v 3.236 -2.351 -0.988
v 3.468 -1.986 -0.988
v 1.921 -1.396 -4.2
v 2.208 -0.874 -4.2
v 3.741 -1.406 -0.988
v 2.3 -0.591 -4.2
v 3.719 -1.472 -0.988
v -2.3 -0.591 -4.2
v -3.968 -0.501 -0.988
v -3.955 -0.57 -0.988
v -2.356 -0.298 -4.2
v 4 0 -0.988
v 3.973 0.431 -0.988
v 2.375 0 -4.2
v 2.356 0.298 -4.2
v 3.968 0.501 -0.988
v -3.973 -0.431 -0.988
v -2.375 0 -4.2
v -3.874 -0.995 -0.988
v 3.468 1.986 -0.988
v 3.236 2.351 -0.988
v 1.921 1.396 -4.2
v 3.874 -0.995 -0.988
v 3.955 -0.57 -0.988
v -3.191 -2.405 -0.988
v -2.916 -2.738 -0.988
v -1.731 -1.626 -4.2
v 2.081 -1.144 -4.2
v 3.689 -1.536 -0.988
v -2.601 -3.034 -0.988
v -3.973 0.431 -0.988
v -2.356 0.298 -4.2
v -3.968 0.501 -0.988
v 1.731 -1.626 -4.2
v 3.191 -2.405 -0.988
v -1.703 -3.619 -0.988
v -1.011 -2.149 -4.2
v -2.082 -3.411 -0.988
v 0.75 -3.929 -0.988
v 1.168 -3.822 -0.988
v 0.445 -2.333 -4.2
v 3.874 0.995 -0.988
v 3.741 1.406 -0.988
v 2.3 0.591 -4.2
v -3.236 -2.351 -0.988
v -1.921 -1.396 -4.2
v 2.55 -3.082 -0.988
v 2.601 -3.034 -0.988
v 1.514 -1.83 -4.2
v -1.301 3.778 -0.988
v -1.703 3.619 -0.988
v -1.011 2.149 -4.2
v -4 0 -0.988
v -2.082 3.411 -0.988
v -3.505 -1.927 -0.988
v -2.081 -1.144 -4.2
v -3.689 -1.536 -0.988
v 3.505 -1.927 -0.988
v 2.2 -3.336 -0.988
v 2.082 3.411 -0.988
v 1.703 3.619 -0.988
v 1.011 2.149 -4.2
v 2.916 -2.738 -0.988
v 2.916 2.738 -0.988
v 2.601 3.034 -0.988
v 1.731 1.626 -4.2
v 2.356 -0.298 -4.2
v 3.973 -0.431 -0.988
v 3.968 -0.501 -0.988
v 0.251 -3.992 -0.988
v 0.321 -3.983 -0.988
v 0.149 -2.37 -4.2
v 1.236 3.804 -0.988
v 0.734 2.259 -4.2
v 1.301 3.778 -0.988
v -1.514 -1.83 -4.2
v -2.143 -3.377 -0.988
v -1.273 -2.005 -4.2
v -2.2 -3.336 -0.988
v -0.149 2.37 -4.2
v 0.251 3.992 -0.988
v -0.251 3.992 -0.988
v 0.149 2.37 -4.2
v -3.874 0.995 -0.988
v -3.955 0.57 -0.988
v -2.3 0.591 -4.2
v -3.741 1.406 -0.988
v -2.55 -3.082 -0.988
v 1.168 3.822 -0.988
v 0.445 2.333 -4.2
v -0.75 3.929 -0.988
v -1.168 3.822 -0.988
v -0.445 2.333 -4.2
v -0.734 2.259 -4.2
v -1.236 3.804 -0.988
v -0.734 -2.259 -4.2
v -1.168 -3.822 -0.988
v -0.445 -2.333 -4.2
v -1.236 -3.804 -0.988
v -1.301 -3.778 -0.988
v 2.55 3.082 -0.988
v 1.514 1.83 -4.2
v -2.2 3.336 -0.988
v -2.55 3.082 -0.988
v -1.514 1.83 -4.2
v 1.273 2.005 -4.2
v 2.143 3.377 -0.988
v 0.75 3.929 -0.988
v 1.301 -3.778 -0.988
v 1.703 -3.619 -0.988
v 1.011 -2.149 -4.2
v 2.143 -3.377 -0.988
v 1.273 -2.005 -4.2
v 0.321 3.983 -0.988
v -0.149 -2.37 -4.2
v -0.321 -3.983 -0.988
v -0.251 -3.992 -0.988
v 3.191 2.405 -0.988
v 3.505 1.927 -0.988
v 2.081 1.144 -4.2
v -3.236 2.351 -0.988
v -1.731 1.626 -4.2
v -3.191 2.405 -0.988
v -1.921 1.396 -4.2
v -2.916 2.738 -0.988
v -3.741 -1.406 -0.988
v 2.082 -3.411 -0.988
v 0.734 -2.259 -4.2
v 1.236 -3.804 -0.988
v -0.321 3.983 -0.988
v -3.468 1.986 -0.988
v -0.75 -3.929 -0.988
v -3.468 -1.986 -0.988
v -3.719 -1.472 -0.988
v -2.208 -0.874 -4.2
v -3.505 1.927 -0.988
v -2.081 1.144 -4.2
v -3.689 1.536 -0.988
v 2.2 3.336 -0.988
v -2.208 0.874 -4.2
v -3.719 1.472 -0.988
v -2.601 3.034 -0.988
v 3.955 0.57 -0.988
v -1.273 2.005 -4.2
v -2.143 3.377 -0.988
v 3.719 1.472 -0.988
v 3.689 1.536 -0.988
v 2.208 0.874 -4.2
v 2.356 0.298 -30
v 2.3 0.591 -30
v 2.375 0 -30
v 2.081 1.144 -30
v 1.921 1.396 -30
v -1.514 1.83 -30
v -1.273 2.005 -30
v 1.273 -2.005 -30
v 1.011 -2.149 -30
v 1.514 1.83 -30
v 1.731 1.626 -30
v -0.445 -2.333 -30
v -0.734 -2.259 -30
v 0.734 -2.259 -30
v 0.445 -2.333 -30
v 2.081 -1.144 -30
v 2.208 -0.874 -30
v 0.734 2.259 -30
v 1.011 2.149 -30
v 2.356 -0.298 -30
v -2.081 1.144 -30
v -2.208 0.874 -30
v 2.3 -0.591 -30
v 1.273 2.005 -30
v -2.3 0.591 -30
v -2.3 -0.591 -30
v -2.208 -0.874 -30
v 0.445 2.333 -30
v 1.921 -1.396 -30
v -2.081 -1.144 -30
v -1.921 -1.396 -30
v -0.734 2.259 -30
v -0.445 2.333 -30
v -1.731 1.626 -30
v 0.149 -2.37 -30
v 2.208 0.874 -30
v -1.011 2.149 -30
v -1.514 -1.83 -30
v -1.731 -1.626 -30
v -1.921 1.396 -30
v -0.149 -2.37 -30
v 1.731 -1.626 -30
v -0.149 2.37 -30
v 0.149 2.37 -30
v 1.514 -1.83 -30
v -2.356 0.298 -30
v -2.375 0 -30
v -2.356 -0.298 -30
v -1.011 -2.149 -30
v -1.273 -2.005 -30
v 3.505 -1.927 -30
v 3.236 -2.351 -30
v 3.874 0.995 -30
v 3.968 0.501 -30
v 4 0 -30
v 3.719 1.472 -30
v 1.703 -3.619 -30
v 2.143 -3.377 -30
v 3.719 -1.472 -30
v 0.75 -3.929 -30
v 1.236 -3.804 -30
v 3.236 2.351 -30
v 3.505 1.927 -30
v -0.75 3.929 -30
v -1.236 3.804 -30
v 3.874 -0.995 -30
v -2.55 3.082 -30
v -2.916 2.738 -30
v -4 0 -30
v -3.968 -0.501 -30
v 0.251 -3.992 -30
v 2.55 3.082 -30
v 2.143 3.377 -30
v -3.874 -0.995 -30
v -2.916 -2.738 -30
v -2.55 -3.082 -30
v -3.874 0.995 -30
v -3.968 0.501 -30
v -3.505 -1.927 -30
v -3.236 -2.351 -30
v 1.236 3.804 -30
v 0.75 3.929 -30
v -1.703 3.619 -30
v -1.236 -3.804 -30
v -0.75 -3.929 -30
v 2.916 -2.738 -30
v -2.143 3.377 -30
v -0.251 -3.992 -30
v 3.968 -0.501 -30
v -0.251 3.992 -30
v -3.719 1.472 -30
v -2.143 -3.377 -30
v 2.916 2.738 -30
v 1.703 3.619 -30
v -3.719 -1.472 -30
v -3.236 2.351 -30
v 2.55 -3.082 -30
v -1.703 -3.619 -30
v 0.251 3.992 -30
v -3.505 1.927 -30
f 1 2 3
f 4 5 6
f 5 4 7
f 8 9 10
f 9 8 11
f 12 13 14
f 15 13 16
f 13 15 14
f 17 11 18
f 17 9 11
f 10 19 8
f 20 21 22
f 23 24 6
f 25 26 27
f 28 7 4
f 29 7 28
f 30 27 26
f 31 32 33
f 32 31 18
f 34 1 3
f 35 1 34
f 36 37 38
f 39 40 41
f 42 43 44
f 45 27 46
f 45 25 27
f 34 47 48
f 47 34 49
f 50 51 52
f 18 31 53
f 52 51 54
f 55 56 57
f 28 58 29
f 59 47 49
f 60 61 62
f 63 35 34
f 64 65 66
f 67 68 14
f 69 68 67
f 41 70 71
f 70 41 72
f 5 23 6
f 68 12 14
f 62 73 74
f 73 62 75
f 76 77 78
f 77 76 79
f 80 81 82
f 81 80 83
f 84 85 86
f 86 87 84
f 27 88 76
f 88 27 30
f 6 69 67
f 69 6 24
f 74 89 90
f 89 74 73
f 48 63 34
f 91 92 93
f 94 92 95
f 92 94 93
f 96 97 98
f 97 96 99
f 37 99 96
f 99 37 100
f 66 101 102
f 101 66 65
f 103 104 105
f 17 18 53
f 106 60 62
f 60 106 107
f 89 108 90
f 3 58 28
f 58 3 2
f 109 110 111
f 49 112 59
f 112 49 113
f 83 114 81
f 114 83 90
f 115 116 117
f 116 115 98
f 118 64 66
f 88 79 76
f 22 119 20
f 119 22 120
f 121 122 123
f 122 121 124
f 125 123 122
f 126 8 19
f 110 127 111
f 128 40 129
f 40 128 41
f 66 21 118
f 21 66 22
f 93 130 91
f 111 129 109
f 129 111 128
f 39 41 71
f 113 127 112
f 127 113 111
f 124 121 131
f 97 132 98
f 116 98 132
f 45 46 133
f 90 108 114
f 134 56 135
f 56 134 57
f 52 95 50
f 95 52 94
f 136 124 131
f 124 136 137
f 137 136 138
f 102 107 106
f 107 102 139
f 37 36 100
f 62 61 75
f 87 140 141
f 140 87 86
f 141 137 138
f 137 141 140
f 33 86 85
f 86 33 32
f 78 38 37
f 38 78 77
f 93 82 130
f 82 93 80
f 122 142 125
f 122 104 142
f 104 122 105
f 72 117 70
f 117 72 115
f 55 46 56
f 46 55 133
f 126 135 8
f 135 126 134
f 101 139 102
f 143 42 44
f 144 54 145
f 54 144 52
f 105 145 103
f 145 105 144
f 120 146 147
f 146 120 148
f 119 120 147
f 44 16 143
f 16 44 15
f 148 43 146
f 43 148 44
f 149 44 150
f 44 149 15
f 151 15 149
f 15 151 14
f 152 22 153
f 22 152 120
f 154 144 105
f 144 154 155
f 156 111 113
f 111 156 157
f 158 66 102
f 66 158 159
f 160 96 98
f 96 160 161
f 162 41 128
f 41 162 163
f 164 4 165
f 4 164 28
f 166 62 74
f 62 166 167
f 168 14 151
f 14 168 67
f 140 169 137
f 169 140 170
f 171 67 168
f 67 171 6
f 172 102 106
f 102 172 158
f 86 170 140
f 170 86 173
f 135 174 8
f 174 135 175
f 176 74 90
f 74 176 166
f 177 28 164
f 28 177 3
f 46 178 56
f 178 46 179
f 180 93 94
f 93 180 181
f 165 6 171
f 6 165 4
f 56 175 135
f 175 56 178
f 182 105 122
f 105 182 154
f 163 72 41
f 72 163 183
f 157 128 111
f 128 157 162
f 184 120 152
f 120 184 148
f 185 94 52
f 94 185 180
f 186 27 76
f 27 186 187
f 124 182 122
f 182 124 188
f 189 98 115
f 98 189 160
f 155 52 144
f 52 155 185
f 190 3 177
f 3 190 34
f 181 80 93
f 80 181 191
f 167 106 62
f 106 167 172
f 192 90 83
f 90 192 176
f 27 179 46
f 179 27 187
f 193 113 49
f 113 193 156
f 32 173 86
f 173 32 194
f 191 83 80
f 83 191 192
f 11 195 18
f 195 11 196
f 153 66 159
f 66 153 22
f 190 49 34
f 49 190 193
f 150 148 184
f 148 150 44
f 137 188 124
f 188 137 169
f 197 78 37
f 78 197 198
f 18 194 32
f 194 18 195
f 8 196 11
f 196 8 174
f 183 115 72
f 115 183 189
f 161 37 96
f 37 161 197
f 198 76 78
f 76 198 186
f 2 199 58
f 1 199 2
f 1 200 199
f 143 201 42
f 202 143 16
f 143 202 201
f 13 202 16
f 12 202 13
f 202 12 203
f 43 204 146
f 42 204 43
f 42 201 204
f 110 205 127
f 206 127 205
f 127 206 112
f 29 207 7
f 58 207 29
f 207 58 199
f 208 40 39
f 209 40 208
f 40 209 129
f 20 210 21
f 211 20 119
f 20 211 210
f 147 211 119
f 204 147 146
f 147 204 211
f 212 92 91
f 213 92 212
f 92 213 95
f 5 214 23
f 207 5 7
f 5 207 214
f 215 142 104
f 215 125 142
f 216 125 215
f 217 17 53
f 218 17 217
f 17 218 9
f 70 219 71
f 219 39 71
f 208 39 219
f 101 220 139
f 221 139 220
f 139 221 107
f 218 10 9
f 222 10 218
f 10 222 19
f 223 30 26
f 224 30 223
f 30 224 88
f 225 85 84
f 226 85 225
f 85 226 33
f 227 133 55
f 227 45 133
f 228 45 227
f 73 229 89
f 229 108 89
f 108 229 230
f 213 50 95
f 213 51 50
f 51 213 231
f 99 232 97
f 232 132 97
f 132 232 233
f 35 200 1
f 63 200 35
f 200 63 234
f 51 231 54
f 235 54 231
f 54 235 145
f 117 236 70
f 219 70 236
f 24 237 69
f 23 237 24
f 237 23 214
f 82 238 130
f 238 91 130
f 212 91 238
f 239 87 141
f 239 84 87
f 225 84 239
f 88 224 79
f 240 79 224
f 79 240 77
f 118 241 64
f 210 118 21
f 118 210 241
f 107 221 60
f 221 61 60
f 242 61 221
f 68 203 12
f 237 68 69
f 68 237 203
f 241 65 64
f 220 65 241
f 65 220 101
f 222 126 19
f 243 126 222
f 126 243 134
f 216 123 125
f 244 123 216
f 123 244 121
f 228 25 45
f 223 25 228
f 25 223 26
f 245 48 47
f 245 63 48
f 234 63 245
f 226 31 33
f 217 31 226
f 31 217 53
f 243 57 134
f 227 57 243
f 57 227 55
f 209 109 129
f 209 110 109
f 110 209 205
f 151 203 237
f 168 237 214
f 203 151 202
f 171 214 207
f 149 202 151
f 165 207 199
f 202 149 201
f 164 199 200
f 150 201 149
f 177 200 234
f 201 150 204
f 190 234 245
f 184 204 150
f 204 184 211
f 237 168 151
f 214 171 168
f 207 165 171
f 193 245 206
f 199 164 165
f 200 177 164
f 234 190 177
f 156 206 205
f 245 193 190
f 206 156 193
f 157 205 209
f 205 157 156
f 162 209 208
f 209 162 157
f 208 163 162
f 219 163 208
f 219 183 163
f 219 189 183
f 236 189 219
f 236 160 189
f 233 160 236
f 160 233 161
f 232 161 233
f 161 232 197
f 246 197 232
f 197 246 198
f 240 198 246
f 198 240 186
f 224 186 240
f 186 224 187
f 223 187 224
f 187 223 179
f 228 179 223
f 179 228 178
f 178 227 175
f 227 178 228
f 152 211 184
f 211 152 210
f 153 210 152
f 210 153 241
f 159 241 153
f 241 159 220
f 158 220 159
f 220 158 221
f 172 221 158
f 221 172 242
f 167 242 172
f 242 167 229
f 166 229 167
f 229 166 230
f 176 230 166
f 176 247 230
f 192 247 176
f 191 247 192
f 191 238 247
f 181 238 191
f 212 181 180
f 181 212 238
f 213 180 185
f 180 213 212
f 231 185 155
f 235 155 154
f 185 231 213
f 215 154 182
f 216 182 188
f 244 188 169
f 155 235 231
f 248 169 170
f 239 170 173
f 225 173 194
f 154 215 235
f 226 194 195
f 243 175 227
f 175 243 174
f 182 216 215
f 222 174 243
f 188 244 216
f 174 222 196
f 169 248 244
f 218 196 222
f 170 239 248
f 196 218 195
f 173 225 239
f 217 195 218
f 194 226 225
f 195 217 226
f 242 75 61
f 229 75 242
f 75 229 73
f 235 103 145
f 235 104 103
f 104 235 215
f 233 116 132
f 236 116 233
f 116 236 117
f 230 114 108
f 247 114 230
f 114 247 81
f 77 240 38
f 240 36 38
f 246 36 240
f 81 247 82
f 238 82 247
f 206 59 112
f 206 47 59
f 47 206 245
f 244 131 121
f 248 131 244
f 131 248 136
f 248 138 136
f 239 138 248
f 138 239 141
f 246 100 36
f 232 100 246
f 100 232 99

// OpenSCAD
$fn = 50;

difference() {
	union() {
		translate(v = [0, 0, -30.0]) {
			cylinder(h = 33, r = 4.0);
		}
	}
	union() {
		translate(v = [0, 0, 0]) {
			rotate(a = [0, 0, 0]) {
				difference() {
					union() {
						translate(v = [0, 0, -33.0]) {
							cylinder(h = 33, r = 2.25);
						}
						translate(v = [0, 0, -4.2]) {
							cylinder(h = 4.2, r1 = 2.375, r2 = 4.5);
						}
						translate(v = [0, 0, -33.0]) {
							cylinder(h = 33, r = 2.375);
						}
						translate(v = [0, 0, -33.0]) {
							cylinder(h = 33, r = 2.25);
						}
					}
					union();
				}
			}
		}
		#cylinder(h = 3, r = 5.0);
	}
}
